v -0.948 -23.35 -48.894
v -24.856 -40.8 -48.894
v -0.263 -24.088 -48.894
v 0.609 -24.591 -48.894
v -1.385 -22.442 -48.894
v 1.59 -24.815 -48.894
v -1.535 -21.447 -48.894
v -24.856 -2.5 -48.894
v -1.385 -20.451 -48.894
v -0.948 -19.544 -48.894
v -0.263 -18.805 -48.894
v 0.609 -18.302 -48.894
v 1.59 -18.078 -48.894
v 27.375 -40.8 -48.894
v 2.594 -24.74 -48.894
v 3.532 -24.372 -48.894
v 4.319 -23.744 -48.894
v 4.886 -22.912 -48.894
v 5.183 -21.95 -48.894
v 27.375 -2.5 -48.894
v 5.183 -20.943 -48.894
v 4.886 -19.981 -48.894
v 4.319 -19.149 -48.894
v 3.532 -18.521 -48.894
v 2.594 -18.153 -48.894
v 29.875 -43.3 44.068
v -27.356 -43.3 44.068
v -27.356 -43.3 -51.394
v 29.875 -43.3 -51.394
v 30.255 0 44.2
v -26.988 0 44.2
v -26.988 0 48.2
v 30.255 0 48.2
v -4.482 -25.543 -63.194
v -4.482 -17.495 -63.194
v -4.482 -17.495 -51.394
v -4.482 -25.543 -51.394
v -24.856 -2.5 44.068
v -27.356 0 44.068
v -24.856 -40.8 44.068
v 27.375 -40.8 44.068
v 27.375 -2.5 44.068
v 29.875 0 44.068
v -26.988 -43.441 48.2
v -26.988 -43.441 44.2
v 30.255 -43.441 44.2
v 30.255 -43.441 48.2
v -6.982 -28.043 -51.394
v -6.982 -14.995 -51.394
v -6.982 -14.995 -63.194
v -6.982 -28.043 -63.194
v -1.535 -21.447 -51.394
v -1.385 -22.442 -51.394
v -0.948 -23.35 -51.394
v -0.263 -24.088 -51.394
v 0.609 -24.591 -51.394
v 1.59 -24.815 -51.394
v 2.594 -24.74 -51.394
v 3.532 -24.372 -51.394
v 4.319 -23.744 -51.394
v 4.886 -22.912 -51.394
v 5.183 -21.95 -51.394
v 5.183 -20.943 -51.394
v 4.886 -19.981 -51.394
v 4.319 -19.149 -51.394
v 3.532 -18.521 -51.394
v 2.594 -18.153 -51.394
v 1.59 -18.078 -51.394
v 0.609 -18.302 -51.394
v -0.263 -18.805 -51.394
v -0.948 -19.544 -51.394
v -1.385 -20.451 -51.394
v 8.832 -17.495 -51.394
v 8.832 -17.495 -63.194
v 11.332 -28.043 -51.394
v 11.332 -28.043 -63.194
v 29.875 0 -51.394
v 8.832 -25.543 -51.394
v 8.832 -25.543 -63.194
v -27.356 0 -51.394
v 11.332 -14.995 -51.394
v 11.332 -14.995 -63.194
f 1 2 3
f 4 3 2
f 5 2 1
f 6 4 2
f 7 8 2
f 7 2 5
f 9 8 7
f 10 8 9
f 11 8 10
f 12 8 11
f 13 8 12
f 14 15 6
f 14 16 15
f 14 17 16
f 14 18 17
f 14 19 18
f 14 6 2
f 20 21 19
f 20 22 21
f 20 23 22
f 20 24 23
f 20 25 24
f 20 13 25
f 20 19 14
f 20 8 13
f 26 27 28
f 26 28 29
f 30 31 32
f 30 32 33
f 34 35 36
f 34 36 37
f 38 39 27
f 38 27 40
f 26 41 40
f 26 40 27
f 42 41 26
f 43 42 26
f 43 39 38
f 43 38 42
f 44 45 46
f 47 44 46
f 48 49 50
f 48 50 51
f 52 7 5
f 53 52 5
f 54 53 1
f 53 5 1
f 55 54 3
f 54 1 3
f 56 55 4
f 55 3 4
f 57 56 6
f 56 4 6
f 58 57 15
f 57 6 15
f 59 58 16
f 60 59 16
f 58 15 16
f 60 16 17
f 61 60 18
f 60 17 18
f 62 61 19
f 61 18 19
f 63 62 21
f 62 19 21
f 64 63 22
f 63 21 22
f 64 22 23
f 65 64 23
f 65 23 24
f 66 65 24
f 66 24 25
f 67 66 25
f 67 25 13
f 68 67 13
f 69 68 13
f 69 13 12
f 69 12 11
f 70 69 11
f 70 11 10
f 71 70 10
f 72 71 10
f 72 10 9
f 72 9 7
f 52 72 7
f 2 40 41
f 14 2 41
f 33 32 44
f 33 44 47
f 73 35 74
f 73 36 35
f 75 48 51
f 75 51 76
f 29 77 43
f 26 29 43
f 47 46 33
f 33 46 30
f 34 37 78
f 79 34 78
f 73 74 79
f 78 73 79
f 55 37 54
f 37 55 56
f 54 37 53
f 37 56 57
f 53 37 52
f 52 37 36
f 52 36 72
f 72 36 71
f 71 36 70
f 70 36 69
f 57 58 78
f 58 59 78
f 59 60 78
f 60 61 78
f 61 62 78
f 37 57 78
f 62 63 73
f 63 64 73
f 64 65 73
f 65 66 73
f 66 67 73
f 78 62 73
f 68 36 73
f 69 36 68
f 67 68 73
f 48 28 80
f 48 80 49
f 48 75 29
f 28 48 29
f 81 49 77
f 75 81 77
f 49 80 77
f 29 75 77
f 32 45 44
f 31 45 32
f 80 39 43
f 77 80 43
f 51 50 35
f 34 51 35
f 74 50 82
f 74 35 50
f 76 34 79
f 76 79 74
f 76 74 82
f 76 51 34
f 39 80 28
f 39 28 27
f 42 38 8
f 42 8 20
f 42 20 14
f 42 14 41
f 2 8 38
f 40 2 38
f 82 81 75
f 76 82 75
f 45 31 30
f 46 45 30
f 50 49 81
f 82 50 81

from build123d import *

# Parameters (mm, degrees)
F0_W      = 57.2311095893
F0_H      = 95.4614840448
F1_DEPTH  = 43.3
F2_T      = -2.5
F3_W      = 18.3139545843
F3_H      = 13.0486916751
F4_DEPTH  = 11.8
F5_T      = -2.5
F7_D      = 6.7564
F9_W      = 57.2428498417
F9_H      = 43.440643698
F10_DEPTH = 4


# Not quite as in the source:
# - a shell that OpenCascade refuses in one call is made with other operations: the cavity is built on its own and cut out


with BuildPart() as f1:
    # F0 (on Front) → F1 (new body)
    with BuildSketch(Plane.XZ):
        with Locations((1.2590847909, -3.6627892405)):
            Rectangle(F0_W, F0_H)
    extrude(amount=F1_DEPTH)

    # F2
    f2_openings = [f1.faces().sort_by_distance(p)[0] for p in [
        (1.259085, -21.65, 44.067953),
    ]]
    offset(amount=F2_T, openings=f2_openings)

    # F3 (on face) → F4 (join)
    with BuildSketch(Plane(origin=(0, 0, -51.3935312629), x_dir=(1, 0, 0), z_dir=(0, 0, -1))):
        with Locations((2.1747821011, 21.5188963339)):
            Rectangle(F3_W, F3_H)
    extrude(amount=F4_DEPTH)

    # F5: a shell. OpenCascade refuses it in one call, so the cavity is built on its own and cut out:
    # the body offset inwards by the wall thickness, plus a prism from it out through each open face.
    f5_core = offset(f1.part, amount=F5_T, kind=Kind.INTERSECTION, mode=Mode.PRIVATE)
    f5_exits = [f5_core.faces().sort_by_distance(p)[0] for p in [
        (2.174782, -21.518896, -60.693531),
    ]]
    add(f5_core, mode=Mode.SUBTRACT)
    extrude(f5_exits, amount=-F5_T, mode=Mode.SUBTRACT)

    # F7 (through all)
    with Locations(Plane(origin=(0, 0, -51.3935312629), x_dir=(1, 0, 0), z_dir=(0, 0, -1))):
        with Locations((1.8427748, 21.4465260506)):
            Hole(F7_D / 2)


with BuildPart() as f10:
    # F9 (on offset) → F10 (new body)
    with BuildSketch(Plane.XY.offset(44.2)):
        with Locations((1.6333451495, -21.720321849)):
            Rectangle(F9_W, F9_H)
    extrude(amount=F10_DEPTH)


solid = Compound([f1.part, f10.part])
